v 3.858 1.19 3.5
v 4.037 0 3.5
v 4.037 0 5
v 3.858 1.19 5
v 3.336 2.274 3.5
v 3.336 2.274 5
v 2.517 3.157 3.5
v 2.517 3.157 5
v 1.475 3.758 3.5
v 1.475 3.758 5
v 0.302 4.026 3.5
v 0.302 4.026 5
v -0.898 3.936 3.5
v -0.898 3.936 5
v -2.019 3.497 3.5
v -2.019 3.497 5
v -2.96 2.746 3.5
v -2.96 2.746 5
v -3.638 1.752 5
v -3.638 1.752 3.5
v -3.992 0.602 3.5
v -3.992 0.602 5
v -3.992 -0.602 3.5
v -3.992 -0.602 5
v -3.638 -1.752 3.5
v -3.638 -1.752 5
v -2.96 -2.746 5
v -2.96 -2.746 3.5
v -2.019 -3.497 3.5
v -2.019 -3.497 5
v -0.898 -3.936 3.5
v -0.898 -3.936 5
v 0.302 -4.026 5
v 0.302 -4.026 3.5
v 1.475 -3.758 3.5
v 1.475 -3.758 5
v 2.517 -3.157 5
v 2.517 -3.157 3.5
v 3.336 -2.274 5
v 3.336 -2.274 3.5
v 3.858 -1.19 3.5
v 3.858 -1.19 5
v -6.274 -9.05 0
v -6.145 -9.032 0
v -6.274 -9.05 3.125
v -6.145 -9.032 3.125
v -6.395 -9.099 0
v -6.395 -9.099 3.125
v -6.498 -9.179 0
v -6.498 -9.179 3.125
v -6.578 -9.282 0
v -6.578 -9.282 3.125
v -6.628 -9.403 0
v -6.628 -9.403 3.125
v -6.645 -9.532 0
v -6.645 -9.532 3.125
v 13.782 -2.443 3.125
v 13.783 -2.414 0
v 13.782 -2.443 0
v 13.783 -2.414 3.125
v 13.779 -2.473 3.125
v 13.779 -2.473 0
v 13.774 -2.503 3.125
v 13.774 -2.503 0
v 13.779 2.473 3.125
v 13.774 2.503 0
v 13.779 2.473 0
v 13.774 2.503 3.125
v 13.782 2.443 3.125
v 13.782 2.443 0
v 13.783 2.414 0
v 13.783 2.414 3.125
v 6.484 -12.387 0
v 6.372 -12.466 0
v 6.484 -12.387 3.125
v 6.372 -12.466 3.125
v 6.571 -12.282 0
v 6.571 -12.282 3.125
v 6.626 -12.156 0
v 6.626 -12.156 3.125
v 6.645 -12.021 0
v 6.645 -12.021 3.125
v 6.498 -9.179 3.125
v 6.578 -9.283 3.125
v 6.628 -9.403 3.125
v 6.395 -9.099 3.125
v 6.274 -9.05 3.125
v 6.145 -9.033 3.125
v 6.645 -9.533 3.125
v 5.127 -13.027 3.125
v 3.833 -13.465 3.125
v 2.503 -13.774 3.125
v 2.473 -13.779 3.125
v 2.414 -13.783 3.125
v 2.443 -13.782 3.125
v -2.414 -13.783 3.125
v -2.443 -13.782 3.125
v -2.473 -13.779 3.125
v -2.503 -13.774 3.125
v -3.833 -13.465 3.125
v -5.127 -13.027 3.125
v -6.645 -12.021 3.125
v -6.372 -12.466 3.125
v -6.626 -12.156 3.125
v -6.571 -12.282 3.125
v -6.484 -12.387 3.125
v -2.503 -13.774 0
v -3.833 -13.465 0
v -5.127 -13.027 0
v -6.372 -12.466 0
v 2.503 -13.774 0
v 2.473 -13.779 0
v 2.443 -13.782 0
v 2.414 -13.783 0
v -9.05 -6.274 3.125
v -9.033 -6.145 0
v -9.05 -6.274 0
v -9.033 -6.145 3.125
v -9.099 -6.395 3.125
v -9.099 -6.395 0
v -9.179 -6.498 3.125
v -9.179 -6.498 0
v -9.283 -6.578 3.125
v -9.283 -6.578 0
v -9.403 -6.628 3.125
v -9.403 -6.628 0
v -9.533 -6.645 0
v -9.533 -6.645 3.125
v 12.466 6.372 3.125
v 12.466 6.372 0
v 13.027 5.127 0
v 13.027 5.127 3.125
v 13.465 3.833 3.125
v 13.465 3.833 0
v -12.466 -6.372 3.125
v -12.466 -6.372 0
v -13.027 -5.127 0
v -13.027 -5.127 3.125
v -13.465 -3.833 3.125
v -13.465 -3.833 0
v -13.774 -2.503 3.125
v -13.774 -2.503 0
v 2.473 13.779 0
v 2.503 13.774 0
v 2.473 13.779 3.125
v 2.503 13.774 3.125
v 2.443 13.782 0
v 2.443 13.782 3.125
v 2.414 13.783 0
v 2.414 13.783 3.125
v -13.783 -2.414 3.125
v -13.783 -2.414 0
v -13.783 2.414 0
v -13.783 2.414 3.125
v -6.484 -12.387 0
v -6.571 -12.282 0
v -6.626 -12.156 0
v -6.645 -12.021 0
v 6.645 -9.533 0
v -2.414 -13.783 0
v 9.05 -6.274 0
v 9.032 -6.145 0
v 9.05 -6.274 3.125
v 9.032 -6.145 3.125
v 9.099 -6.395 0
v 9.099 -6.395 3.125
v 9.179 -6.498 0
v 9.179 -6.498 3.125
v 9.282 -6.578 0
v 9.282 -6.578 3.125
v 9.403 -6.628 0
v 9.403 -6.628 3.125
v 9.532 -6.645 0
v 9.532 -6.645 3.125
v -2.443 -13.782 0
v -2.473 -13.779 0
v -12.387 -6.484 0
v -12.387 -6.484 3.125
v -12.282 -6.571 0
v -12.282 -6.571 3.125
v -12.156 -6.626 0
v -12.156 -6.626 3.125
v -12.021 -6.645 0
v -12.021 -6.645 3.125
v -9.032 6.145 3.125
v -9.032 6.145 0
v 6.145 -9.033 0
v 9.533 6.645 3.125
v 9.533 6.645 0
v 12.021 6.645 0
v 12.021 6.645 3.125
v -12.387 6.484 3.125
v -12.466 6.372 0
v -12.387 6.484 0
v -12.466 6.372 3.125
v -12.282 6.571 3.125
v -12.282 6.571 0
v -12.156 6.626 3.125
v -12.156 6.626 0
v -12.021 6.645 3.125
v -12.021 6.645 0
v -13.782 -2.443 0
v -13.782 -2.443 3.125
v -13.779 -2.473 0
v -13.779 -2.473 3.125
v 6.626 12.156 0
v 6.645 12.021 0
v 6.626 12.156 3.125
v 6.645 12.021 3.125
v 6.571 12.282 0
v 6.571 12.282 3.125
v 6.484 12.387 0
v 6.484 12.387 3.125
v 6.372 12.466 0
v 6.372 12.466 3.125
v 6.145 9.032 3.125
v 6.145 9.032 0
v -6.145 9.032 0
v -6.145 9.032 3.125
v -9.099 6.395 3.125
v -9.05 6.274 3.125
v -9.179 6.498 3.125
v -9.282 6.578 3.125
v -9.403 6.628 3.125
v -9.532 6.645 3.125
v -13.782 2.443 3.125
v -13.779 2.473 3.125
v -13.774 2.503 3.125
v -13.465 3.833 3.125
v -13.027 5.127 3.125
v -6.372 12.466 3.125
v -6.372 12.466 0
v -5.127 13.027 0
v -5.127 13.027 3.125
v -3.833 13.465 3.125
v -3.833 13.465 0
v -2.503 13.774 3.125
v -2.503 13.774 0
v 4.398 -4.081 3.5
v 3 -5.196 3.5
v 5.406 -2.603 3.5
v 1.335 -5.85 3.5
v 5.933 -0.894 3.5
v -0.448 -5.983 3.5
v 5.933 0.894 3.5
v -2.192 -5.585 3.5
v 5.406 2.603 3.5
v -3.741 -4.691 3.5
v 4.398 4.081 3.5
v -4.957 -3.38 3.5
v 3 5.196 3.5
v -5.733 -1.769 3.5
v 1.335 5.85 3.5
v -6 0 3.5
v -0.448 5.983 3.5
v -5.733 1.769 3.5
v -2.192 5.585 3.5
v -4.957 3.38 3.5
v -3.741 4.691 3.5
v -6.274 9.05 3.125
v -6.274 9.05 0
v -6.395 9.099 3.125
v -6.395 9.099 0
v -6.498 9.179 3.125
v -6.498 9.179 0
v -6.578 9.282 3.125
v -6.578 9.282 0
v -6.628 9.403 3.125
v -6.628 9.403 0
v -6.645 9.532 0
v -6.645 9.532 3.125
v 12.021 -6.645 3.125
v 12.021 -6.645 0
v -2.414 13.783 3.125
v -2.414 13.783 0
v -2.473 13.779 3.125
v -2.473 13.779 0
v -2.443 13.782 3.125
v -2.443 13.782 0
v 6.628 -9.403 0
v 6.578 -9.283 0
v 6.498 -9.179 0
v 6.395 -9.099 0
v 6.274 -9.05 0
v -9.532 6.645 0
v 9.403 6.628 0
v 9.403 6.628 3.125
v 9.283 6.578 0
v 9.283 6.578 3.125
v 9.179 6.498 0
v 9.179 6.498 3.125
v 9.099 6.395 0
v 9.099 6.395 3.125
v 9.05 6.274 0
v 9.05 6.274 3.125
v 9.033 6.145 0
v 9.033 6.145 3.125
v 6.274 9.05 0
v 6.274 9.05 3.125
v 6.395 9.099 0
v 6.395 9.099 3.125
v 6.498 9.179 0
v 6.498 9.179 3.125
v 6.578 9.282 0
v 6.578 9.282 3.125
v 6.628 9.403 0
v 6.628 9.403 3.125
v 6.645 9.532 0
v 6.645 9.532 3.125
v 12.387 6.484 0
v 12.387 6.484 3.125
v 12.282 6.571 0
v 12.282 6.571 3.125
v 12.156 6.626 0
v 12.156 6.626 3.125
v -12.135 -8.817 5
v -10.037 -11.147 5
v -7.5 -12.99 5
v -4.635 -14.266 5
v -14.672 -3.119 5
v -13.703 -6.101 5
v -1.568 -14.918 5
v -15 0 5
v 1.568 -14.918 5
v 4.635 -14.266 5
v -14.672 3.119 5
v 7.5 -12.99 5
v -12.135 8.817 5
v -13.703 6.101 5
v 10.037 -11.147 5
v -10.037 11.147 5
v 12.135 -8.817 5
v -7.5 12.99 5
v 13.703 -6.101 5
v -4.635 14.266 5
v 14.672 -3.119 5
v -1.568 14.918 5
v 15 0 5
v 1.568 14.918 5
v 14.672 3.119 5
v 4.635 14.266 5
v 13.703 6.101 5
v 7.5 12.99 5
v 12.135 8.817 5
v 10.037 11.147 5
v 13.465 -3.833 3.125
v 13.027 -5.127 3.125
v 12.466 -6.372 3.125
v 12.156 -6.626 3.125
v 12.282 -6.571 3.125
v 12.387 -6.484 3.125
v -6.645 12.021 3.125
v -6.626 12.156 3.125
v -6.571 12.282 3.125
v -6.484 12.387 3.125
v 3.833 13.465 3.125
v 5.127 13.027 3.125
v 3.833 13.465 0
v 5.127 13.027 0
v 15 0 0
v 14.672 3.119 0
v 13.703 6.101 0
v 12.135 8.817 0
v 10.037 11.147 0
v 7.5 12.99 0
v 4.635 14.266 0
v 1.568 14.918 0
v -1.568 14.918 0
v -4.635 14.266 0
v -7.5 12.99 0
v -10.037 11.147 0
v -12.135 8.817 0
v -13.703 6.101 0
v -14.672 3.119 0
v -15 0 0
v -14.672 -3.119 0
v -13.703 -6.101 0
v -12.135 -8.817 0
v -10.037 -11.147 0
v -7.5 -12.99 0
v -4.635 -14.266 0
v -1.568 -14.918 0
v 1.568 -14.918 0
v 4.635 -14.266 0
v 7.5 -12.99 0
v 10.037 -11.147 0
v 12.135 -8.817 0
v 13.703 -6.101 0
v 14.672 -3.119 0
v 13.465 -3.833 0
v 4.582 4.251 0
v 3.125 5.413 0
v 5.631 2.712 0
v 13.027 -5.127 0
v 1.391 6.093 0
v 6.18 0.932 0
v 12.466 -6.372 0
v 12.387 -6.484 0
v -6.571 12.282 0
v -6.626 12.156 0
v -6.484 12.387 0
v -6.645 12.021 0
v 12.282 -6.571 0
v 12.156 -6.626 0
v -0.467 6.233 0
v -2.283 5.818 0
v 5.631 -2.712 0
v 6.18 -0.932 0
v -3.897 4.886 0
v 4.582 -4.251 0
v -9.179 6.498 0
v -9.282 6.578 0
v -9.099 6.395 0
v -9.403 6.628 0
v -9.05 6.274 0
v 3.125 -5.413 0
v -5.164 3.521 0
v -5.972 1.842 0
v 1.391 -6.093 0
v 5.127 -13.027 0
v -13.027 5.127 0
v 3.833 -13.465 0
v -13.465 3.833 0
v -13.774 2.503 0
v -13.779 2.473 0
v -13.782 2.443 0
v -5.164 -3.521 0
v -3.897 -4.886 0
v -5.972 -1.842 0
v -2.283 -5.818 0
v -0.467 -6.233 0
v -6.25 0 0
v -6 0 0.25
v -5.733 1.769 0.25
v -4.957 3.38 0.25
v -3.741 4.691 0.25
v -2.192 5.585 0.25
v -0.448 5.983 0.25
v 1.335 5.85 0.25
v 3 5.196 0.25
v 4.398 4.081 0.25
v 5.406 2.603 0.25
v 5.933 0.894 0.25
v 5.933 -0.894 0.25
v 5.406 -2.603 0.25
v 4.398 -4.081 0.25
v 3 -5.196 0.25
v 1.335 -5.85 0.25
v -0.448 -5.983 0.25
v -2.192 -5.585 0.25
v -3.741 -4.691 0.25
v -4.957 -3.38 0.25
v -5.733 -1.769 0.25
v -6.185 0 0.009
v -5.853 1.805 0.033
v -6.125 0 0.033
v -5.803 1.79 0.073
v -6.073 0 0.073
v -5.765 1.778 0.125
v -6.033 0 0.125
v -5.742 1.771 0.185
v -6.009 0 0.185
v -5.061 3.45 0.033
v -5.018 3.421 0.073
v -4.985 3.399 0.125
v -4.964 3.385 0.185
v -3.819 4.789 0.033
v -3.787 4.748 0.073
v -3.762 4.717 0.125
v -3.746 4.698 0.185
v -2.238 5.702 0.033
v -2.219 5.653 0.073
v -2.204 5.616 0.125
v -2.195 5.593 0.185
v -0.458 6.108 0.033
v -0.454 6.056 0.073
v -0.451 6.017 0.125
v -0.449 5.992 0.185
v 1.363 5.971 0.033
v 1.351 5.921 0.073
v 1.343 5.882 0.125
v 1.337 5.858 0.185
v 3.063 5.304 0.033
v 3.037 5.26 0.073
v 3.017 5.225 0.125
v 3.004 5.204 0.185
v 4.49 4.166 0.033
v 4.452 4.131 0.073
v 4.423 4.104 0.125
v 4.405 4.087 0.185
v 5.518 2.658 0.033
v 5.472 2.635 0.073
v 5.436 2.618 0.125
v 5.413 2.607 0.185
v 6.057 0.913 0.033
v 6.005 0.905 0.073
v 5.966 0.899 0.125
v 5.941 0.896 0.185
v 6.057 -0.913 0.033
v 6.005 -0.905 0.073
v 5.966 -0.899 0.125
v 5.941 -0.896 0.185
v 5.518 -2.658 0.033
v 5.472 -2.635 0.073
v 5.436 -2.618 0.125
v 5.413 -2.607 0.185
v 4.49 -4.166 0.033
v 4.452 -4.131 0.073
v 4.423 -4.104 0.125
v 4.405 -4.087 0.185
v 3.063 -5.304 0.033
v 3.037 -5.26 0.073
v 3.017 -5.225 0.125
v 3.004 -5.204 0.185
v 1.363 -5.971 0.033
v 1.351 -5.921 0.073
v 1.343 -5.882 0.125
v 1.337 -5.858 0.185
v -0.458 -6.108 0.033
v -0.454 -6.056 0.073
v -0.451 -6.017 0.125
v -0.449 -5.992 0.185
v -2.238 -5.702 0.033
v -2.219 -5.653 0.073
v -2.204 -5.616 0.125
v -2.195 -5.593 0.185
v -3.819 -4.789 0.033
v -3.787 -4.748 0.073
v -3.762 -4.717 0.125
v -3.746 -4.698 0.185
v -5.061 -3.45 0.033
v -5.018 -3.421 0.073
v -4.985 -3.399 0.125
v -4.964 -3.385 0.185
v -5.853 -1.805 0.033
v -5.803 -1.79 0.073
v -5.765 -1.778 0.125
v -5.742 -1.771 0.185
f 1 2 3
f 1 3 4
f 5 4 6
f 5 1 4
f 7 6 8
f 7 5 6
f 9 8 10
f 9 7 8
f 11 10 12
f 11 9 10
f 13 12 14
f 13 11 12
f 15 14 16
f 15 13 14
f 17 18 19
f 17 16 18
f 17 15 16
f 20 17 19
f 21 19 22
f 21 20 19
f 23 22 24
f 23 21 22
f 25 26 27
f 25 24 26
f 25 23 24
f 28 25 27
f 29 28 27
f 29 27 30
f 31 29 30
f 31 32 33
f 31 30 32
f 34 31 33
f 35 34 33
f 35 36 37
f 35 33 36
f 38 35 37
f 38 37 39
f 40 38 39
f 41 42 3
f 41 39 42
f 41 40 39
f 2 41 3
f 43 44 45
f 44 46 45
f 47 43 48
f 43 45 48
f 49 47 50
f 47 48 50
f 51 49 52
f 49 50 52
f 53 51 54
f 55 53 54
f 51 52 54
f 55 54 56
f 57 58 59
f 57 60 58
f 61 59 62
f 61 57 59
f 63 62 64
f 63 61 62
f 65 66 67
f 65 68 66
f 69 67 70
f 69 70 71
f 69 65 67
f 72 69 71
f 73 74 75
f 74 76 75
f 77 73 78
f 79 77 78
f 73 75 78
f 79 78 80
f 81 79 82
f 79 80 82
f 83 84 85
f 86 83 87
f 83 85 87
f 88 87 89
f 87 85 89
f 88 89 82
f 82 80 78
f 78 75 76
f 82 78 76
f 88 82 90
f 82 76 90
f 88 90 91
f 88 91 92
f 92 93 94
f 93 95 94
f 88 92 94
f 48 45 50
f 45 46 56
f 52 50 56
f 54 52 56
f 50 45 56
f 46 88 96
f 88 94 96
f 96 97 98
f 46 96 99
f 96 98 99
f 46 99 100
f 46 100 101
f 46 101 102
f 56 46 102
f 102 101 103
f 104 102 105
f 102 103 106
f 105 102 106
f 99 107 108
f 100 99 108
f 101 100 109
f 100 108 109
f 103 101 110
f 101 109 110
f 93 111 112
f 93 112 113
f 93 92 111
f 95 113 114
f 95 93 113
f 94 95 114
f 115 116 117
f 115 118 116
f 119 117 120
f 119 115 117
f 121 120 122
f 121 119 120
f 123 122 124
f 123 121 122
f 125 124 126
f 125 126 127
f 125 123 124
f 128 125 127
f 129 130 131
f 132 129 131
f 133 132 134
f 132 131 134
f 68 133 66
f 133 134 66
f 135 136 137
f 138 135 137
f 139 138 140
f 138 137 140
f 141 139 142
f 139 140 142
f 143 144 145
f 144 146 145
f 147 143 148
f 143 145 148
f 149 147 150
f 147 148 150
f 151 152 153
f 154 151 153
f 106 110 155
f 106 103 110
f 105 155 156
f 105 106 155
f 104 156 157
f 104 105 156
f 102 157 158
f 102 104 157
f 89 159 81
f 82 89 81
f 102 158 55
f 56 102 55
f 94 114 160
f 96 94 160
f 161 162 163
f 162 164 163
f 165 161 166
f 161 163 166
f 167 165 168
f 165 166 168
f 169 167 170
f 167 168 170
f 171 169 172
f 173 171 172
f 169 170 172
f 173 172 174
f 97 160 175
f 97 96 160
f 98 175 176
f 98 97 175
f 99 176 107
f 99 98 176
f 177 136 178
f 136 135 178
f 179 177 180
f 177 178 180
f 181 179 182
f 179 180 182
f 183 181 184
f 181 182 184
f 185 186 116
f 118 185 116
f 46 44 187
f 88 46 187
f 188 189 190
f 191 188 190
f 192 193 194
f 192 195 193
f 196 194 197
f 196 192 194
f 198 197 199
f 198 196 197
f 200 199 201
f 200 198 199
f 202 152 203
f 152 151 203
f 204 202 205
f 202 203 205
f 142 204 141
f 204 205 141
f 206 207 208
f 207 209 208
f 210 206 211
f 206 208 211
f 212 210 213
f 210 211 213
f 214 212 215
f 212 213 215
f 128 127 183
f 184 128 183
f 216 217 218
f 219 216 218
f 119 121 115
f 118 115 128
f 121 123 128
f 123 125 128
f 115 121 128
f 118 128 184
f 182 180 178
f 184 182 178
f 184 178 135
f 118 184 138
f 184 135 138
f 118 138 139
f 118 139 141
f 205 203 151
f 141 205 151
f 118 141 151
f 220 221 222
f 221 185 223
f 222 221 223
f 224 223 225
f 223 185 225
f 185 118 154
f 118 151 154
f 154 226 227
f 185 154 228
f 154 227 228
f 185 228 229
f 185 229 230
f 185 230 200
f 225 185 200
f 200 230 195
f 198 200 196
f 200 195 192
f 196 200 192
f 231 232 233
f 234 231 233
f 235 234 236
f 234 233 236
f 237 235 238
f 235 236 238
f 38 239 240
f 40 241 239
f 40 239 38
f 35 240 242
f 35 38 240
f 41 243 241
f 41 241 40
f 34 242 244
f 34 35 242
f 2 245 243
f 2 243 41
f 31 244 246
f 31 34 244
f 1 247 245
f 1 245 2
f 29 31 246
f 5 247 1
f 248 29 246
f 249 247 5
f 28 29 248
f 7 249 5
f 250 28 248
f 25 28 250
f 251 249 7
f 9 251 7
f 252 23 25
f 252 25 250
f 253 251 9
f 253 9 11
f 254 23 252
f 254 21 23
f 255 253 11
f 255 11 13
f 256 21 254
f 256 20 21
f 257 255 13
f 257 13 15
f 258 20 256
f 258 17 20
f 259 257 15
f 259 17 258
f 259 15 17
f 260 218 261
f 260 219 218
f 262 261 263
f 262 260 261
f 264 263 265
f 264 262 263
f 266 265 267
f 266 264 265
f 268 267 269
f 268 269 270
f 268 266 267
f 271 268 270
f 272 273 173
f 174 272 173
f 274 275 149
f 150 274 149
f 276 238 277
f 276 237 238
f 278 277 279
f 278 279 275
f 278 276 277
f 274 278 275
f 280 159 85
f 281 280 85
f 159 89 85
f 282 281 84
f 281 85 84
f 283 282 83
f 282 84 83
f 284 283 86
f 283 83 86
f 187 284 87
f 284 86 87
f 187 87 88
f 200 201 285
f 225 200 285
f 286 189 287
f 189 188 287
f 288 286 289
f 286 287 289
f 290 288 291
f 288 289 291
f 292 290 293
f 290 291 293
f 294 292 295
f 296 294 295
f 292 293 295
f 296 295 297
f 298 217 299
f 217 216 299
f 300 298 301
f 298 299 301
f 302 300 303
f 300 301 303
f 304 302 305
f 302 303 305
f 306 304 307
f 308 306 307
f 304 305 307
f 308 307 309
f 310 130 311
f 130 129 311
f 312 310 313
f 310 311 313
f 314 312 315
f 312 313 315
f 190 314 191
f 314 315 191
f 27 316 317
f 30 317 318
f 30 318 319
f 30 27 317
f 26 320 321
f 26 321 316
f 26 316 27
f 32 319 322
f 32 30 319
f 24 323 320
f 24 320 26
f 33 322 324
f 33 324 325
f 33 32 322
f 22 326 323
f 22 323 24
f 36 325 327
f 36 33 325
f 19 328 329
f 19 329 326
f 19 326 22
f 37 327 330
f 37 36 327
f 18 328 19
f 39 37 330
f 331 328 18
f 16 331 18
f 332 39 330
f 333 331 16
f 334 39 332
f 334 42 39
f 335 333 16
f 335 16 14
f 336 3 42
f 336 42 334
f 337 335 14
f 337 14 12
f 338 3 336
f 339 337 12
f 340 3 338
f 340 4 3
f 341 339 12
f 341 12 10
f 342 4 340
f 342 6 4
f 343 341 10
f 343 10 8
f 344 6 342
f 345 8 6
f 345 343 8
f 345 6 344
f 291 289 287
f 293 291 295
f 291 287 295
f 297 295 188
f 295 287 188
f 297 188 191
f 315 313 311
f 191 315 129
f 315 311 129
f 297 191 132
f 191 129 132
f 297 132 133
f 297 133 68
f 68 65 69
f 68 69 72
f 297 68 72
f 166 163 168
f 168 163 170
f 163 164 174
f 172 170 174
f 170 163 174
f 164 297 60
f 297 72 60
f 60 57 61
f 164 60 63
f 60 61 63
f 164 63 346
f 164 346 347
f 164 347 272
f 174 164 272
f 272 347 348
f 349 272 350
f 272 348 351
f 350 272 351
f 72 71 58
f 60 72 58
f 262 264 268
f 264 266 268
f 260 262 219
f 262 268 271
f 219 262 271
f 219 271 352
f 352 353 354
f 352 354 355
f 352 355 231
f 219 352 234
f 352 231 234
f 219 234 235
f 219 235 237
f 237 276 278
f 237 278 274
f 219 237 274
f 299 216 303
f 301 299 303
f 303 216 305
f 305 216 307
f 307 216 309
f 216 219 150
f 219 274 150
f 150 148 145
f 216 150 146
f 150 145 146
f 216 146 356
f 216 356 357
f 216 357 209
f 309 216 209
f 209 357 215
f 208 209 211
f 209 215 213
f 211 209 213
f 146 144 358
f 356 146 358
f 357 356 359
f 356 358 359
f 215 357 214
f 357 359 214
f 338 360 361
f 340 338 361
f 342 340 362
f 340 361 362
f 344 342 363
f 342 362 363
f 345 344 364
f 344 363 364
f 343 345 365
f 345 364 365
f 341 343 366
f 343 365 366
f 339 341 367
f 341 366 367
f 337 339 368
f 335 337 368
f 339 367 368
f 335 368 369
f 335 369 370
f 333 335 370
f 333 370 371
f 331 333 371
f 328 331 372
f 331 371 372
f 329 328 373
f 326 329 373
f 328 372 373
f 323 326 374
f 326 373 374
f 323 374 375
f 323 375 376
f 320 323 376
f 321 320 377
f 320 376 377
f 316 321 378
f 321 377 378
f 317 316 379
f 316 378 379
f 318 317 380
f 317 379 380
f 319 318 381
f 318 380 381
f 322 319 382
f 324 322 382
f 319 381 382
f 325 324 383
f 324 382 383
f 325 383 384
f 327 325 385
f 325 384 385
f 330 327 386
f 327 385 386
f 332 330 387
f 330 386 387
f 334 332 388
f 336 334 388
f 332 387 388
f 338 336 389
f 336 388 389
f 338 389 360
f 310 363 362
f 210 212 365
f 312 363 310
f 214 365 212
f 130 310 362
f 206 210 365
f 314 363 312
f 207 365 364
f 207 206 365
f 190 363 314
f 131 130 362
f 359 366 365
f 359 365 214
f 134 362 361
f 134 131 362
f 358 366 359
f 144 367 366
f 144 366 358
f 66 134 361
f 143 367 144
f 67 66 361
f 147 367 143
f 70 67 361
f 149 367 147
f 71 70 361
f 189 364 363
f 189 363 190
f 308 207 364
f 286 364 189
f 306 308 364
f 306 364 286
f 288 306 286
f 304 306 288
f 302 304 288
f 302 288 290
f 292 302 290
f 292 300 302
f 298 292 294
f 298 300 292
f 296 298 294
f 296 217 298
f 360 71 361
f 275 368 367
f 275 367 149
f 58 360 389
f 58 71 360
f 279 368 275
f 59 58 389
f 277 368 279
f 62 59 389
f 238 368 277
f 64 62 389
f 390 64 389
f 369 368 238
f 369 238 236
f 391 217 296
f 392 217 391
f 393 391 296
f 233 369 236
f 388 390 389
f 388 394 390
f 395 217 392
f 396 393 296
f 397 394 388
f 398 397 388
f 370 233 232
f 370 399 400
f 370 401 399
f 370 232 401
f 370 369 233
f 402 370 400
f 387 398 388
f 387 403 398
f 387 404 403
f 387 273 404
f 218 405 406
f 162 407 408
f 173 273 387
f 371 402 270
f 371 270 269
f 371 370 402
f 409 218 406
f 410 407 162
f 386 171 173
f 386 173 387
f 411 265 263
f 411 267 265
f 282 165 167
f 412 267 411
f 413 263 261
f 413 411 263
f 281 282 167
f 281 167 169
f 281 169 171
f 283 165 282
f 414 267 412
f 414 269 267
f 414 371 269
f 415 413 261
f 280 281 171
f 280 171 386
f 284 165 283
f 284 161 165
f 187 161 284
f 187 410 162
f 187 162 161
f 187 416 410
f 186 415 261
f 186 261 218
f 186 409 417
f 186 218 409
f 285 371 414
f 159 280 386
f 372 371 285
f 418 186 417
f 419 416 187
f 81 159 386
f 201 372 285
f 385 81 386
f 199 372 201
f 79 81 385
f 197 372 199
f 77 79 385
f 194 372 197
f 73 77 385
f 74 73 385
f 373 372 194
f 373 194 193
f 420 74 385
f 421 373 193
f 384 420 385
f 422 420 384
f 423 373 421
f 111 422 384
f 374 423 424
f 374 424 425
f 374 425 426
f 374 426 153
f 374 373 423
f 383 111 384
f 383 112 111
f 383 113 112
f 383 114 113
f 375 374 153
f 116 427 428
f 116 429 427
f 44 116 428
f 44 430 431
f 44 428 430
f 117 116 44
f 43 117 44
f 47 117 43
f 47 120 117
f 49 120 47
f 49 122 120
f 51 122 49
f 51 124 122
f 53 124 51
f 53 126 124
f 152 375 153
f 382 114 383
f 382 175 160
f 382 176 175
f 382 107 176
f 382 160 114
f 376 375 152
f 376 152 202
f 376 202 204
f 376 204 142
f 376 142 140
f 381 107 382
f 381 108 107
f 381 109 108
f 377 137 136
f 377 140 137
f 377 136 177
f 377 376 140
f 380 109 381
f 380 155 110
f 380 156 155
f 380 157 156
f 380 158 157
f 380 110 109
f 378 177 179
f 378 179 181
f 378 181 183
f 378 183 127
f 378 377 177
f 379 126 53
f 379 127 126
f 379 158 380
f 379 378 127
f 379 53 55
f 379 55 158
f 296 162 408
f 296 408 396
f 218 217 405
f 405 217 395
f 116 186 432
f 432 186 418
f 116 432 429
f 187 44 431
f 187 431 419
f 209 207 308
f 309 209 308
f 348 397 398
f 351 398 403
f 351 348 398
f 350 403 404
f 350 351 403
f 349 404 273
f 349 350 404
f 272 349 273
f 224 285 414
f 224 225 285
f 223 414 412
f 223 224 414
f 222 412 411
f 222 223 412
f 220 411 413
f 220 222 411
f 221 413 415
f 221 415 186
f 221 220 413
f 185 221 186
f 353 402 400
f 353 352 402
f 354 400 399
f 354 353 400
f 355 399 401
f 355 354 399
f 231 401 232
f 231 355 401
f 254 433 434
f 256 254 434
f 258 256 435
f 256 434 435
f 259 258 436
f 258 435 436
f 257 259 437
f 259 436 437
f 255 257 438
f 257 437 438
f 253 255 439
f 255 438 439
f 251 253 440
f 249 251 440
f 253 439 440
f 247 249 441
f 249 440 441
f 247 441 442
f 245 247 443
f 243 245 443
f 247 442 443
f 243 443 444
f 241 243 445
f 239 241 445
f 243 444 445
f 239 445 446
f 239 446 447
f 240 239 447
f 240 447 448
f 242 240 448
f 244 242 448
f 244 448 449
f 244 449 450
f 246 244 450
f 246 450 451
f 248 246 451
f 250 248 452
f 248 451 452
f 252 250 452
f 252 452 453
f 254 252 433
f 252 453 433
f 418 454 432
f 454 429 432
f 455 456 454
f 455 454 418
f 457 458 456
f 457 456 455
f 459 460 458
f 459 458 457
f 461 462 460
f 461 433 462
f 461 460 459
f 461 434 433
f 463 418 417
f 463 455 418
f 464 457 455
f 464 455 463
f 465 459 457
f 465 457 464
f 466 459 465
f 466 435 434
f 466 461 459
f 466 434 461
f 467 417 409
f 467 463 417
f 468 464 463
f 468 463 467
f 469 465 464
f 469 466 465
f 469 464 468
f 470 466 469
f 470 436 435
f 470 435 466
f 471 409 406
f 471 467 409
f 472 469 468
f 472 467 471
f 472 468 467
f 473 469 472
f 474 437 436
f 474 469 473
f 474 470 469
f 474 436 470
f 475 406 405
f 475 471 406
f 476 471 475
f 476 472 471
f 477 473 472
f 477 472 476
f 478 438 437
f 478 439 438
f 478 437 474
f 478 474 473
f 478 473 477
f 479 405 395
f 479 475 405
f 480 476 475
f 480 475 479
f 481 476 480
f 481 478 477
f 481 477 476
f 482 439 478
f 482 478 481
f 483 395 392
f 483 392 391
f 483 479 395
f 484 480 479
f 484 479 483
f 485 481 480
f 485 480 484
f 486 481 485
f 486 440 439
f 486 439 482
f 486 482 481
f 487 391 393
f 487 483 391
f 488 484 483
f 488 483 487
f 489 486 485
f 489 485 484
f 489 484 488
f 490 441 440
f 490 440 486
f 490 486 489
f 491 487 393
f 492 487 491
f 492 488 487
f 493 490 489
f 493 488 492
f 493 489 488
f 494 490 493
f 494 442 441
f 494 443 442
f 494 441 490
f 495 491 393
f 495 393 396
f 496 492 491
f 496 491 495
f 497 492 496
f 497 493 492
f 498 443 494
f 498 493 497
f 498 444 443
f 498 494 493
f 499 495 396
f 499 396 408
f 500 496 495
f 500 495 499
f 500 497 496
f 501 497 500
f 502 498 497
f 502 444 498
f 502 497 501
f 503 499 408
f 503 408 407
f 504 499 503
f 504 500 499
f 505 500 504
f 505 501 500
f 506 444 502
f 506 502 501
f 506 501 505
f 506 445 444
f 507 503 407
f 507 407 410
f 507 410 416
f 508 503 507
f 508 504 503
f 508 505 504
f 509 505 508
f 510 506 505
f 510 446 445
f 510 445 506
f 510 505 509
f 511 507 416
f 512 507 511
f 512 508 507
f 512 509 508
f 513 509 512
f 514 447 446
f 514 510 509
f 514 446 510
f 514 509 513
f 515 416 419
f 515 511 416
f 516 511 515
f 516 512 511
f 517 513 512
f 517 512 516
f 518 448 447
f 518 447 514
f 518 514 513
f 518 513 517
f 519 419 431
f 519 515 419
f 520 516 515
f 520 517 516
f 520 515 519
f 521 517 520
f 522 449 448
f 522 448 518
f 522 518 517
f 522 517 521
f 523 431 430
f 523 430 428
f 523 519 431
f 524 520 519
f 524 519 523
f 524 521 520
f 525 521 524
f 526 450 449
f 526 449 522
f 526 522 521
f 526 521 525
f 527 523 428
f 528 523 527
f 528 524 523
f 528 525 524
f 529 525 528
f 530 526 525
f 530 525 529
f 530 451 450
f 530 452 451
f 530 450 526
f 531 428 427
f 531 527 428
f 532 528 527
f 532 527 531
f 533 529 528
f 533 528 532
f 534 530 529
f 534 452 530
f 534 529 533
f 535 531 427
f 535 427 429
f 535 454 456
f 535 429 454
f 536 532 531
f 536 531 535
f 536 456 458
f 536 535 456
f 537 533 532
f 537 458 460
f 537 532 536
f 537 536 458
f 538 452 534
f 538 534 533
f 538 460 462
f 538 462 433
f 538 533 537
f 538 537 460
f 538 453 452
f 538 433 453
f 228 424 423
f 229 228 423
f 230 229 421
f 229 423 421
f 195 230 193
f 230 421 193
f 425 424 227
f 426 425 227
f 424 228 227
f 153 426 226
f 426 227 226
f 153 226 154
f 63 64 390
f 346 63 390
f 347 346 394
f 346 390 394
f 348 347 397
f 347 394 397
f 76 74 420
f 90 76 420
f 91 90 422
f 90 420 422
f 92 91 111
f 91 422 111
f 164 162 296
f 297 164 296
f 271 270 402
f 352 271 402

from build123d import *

# Parameters (mm, degrees)
SKETCH1_R               = 15
BOSS_EXTRUDE1_DEPTH     = 5
CUT_EXTRUDE1_DEPTH      = 3.125
BOSS_EXTRUDE4_START     = 3.125
BOSS_EXTRUDE4_DEPTH     = 3.125
CIRPATTERN1_COUNT       = 4
SKETCH4_R               = 6
CUT_EXTRUDE2_DEPTH      = 3.5
FILLET1_R               = 0.25
CUT_EXTRUDE3_DEPTH      = 22.794494718
CUT_EXTRUDE3_DEPTH_BACK = 22.794494718
SKETCH5_R               = 4.0375
FILLET2_R               = 0.5


with BuildPart() as part:
    # Sketch1 → Boss-Extrude1 (new body)
    with BuildSketch(Plane.XY):
        Circle(SKETCH1_R)
    extrude(amount=BOSS_EXTRUDE1_DEPTH)

    # Sketch1<5> → Cut-Extrude1 (cut)
    with BuildSketch(Plane.XY):
        with BuildLine():
            ThreePointArc((-2.469224322, 13.9075), (-4.680749466, 13.326897968), (-6.769624128, 12.397088939))
            Line((-6.769624128, 12.397088939), (-6.769624128, 8.9075))
            Line((-6.769624128, 8.9075), (6.769624128, 8.9075))
            Line((6.769624128, 8.9075), (6.769624128, 12.397088939))
            ThreePointArc((6.769624128, 12.397088939), (4.680749466, 13.326897968), (2.469224322, 13.9075))
            Line((2.469224322, 13.9075), (-2.469224322, 13.9075))
        make_face()
    cut_extrude1 = extrude(amount=CUT_EXTRUDE1_DEPTH, mode=Mode.SUBTRACT)

    # Sketch7 → Boss-Extrude4 (add)
    with BuildSketch(Plane(origin=(0, 0, 3.125), x_dir=(-1, 0, 0), z_dir=(0, 0, -1)).offset(BOSS_EXTRUDE4_START)):
        with BuildLine():
            ThreePointArc((-2.469224322, 13.9075), (-4.680749466, 13.326897968), (-6.769624128, 12.397088939))
            Line((-6.769624128, 12.397088939), (-6.769624128, 8.9075))
            Line((-6.769624128, 8.9075), (6.769624128, 8.9075))
            Line((6.769624128, 8.9075), (6.769624128, 12.397088939))
            ThreePointArc((6.769624128, 12.397088939), (4.680749466, 13.326897968), (2.469224322, 13.9075))
            Line((2.469224322, 13.9075), (-2.469224322, 13.9075))
        make_face()
        with BuildLine():
            Line((-6.644624128, 9.0325), (-6.644624128, 12.322701416))
            ThreePointArc((-6.644624128, 12.322701416), (-4.609561284, 13.219377624), (-2.45818912, 13.7825))
            Line((-2.45818912, 13.7825), (2.45818912, 13.7825))
            ThreePointArc((2.45818912, 13.7825), (4.609561284, 13.219377624), (6.644624128, 12.322701416))
            Line((6.644624128, 12.322701416), (6.644624128, 9.0325))
            Line((6.644624128, 9.0325), (-6.644624128, 9.0325))
        make_face(mode=Mode.SUBTRACT)
    boss_extrude4 = extrude(amount=-BOSS_EXTRUDE4_DEPTH)

    # CirPattern1: Cut-Extrude1, Boss-Extrude4 ×4 about axis
    cirpattern1_axis = Axis((0, 0, -0.25), (0, 0, 1))
    add([cut_extrude1.rotate(cirpattern1_axis, i * 360 / CIRPATTERN1_COUNT) for i in range(1, CIRPATTERN1_COUNT)], mode=Mode.SUBTRACT)
    add([boss_extrude4.rotate(cirpattern1_axis, i * 360 / CIRPATTERN1_COUNT) for i in range(1, CIRPATTERN1_COUNT)])

    # Sketch4 → Cut-Extrude2 (cut)
    with BuildSketch(Plane(origin=(0, 0, 0), x_dir=(-1, 0, 0), z_dir=(0, 0, -1))):
        Circle(SKETCH4_R)
    extrude(amount=-CUT_EXTRUDE2_DEPTH, mode=Mode.SUBTRACT)

    # Fillet1
    fillet1_edges = [part.edges().sort_by_distance(p)[0] for p in [
        (6, 0, 0),
    ]]
    fillet(fillet1_edges, radius=FILLET1_R)

    # Sketch5 → Cut-Extrude3 (cut, two sides: drawn at the far end of the back side and taken through both)
    with BuildSketch(Plane.XY.offset(5).offset(-CUT_EXTRUDE3_DEPTH_BACK)):
        Circle(SKETCH5_R)
    extrude(amount=CUT_EXTRUDE3_DEPTH + CUT_EXTRUDE3_DEPTH_BACK, mode=Mode.SUBTRACT)

    # Fillet2
    fillet2_edges = [part.edges().sort_by_distance(p)[0] for p in [
        (12.322701416, -6.644624128, 1.5625),
        (9.0325, -6.644624128, 1.5625),
        (9.0325, 6.644624128, 1.5625),
        (12.322701416, 6.644624128, 1.5625),
        (13.7825, 2.45818912, 1.5625),
        (13.7825, -2.45818912, 1.5625),
        (-6.644624128, -12.322701416, 1.5625),
        (-6.644624128, -9.0325, 1.5625),
        (6.644624128, -9.0325, 1.5625),
        (6.644624128, -12.322701416, 1.5625),
        (2.45818912, -13.7825, 1.5625),
        (-2.45818912, -13.7825, 1.5625),
        (-12.322701416, 6.644624128, 1.5625),
        (-9.0325, 6.644624128, 1.5625),
        (-9.0325, -6.644624128, 1.5625),
        (-12.322701416, -6.644624128, 1.5625),
        (-13.7825, -2.45818912, 1.5625),
        (-13.7825, 2.45818912, 1.5625),
        (6.644624128, 9.0325, 1.5625),
        (-6.644624128, 9.0325, 1.5625),
        (-6.644624128, 12.322701416, 1.5625),
        (-2.45818912, 13.7825, 1.5625),
        (2.45818912, 13.7825, 1.5625),
        (6.644624128, 12.322701416, 1.5625),
    ]]
    fillet(fillet2_edges, radius=FILLET2_R)


solid = part.part
